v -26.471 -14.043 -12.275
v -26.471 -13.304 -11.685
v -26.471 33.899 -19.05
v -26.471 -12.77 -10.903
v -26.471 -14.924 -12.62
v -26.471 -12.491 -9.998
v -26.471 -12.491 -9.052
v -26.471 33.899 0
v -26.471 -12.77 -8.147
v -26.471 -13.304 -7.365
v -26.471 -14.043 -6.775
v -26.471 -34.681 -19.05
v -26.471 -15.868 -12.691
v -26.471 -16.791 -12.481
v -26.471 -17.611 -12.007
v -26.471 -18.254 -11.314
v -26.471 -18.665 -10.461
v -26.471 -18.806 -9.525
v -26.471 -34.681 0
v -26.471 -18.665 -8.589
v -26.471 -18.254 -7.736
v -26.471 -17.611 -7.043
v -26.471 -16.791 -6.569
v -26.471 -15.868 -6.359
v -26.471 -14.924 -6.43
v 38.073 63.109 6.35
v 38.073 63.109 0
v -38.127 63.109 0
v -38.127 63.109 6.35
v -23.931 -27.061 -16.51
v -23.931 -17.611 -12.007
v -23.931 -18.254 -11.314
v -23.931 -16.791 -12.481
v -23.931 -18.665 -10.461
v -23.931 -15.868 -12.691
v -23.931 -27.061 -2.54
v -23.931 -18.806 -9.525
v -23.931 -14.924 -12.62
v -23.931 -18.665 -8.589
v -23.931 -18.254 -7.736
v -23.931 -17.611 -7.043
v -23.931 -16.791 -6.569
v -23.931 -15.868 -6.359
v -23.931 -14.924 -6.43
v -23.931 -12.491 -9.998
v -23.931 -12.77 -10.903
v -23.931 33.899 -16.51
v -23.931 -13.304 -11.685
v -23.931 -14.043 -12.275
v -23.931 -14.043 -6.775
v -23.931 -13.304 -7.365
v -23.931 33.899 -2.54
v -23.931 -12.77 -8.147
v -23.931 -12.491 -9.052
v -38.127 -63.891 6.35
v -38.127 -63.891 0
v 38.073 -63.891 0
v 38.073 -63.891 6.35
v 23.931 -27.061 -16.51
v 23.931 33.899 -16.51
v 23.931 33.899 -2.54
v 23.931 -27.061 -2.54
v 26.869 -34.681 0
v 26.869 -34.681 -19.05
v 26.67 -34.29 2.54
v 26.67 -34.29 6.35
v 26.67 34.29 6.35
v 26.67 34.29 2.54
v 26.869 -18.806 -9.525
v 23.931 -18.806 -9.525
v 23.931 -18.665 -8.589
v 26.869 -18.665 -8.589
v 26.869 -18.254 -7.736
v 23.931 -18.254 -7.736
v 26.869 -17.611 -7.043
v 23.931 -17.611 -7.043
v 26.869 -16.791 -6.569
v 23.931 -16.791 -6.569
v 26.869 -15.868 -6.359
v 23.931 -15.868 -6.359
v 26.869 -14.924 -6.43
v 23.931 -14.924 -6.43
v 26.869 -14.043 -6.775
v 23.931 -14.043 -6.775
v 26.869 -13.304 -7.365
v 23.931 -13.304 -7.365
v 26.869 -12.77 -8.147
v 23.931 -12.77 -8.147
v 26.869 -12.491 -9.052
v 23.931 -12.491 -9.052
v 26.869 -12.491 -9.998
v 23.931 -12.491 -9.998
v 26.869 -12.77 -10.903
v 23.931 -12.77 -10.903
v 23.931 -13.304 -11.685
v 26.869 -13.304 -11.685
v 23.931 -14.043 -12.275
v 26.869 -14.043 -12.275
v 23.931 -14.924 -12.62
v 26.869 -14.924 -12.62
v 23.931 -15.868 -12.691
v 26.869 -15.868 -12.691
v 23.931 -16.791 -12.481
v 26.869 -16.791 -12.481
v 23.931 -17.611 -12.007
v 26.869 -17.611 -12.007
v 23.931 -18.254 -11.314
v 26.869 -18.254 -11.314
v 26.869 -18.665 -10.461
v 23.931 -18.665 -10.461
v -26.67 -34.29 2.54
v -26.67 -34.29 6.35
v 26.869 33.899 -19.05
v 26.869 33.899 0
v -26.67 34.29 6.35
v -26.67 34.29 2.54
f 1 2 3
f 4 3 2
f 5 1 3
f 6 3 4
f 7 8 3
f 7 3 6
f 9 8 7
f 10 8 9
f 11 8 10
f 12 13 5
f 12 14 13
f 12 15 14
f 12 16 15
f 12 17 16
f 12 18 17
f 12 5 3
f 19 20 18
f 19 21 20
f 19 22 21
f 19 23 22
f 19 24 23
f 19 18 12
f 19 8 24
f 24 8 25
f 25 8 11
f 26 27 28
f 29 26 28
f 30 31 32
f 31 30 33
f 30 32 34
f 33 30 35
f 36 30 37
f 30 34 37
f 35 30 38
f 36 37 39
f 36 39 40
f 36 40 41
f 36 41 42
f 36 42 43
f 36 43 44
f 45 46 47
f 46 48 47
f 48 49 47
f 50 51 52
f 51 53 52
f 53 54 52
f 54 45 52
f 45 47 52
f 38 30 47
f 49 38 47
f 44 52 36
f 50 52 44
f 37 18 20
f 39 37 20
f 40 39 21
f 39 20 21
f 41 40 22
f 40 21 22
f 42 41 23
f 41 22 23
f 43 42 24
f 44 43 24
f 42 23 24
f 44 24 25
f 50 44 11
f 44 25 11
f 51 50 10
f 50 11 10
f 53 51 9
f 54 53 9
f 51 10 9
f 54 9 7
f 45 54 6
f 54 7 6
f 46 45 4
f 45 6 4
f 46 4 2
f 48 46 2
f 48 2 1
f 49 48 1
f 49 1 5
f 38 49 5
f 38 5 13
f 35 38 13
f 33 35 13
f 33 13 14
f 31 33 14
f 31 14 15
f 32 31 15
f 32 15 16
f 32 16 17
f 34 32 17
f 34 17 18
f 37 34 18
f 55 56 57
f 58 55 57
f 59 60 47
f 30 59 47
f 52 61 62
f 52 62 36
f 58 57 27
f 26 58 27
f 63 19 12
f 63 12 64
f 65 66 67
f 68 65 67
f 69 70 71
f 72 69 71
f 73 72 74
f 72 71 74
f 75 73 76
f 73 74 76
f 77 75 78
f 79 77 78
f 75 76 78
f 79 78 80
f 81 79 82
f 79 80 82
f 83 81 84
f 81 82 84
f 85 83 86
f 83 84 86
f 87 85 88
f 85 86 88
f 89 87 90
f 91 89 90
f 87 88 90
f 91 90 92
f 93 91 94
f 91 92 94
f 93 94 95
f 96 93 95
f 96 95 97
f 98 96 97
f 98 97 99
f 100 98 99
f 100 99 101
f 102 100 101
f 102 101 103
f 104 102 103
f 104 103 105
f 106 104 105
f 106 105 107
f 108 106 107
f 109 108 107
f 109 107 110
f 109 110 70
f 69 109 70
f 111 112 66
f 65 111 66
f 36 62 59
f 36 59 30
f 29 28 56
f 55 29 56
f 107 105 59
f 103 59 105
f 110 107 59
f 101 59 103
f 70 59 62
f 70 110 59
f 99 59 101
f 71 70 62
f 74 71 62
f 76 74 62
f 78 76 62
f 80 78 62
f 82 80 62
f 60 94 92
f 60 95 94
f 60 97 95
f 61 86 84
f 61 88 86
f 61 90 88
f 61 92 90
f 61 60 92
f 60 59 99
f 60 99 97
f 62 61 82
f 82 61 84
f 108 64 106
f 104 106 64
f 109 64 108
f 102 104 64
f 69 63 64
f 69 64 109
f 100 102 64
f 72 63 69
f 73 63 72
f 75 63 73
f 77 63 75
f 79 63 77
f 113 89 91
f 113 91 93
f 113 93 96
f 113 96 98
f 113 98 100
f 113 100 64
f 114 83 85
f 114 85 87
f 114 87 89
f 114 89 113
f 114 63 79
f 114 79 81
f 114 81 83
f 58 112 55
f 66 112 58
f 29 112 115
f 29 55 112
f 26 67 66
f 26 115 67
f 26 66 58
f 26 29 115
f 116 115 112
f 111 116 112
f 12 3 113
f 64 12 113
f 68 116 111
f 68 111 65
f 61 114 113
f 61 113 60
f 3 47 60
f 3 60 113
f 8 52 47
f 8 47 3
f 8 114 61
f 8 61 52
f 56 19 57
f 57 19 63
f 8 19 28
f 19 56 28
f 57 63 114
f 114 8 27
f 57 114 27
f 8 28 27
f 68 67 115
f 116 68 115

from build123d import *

# Parameters (mm, degrees)
F1_DEPTH = 19.05
F2_W     = 47.8625434434
F2_H     = 13.97
F3_DEPTH = 60.96
F4_DEPTH = 6.35
F6_D     = 6.35
F8_DEPTH = 3.81


# Not quite as in the source:
# - a feature names something its author has since deleted; it is built from what else it names


with BuildPart() as f1:
    # F0 (on Top) → F1 (new body)
    with BuildSketch(Plane.XY):
        Polygon((-0.0274520135, 33.8990125982), (-26.4712717217, 33.8990125982), (-26.4712717217, -0.3909874018), (-26.4712717217, -34.6809874018), (16.3237974048, -34.6809874018), (26.8687282783, -34.6809874018), (26.8687282783, -0.3909874018), (26.8687282783, 33.8990125982), align=None)
    extrude(amount=-F1_DEPTH)

    # F2 (on face) → F3 (cut)
    with BuildSketch(Plane(origin=(0, 33.8990125982, 0), x_dir=(-1, 0, 0), z_dir=(0, 1, 0))):
        with Locations((0, -9.525)):
            Rectangle(F2_W, F2_H)
    extrude(amount=-F3_DEPTH, mode=Mode.SUBTRACT)

    # F0 (on Top) → F4 (join)
    with BuildSketch(Plane.XY):
        Polygon((-26.4712717217, -0.3909874018), (-26.4712717217, 33.8990125982), (-0.0274520135, 33.8990125982), (-0.0274520135, 37.7090125982), (-0.0274520135, 63.1090125982), (-38.1274520135, 63.1090125982), (-38.1274520135, -63.8909874018), (16.3237974048, -63.8909874018), (16.3237974048, -34.6809874018), (-26.4712717217, -34.6809874018), align=None)
        Polygon((-0.0274520135, 33.8990125982), (-26.4712717217, 33.8990125982), (-26.4712717217, -0.3909874018), (-26.4712717217, -34.6809874018), (16.3237974048, -34.6809874018), (26.8687282783, -34.6809874018), (26.8687282783, -0.3909874018), (26.8687282783, 33.8990125982), align=None)
        Polygon((-0.0274520135, 37.7090125982), (-0.0274520135, 33.8990125982), (26.8687282783, 33.8990125982), (26.8687282783, -0.3909874018), (38.0725479865, -0.3909874018), (38.0725479865, 63.1090125982), (-0.0274520135, 63.1090125982), align=None)
        Polygon((38.0725479865, -0.3909874018), (26.8687282783, -0.3909874018), (26.8687282783, -34.6809874018), (16.3237974048, -34.6809874018), (16.3237974048, -63.8909874018), (38.0725479865, -63.8909874018), align=None)
    extrude(amount=F4_DEPTH)

    # F6 (through all)
    with Locations(Plane.YZ.offset(26.8687282783)):
        with Locations((-15.6309874018, -9.525)):
            Hole(F6_D / 2)

    # F7 (on face) → F8 (cut)
    with BuildSketch(Plane.XY.offset(6.35)):
        Polygon((26.67, -34.29), (26.67, 0), (26.67, 34.29), (-26.67, 34.29), (-26.67, 0), (-26.67, -34.29), align=None)
    extrude(amount=-F8_DEPTH, mode=Mode.SUBTRACT)


solid = f1.part
